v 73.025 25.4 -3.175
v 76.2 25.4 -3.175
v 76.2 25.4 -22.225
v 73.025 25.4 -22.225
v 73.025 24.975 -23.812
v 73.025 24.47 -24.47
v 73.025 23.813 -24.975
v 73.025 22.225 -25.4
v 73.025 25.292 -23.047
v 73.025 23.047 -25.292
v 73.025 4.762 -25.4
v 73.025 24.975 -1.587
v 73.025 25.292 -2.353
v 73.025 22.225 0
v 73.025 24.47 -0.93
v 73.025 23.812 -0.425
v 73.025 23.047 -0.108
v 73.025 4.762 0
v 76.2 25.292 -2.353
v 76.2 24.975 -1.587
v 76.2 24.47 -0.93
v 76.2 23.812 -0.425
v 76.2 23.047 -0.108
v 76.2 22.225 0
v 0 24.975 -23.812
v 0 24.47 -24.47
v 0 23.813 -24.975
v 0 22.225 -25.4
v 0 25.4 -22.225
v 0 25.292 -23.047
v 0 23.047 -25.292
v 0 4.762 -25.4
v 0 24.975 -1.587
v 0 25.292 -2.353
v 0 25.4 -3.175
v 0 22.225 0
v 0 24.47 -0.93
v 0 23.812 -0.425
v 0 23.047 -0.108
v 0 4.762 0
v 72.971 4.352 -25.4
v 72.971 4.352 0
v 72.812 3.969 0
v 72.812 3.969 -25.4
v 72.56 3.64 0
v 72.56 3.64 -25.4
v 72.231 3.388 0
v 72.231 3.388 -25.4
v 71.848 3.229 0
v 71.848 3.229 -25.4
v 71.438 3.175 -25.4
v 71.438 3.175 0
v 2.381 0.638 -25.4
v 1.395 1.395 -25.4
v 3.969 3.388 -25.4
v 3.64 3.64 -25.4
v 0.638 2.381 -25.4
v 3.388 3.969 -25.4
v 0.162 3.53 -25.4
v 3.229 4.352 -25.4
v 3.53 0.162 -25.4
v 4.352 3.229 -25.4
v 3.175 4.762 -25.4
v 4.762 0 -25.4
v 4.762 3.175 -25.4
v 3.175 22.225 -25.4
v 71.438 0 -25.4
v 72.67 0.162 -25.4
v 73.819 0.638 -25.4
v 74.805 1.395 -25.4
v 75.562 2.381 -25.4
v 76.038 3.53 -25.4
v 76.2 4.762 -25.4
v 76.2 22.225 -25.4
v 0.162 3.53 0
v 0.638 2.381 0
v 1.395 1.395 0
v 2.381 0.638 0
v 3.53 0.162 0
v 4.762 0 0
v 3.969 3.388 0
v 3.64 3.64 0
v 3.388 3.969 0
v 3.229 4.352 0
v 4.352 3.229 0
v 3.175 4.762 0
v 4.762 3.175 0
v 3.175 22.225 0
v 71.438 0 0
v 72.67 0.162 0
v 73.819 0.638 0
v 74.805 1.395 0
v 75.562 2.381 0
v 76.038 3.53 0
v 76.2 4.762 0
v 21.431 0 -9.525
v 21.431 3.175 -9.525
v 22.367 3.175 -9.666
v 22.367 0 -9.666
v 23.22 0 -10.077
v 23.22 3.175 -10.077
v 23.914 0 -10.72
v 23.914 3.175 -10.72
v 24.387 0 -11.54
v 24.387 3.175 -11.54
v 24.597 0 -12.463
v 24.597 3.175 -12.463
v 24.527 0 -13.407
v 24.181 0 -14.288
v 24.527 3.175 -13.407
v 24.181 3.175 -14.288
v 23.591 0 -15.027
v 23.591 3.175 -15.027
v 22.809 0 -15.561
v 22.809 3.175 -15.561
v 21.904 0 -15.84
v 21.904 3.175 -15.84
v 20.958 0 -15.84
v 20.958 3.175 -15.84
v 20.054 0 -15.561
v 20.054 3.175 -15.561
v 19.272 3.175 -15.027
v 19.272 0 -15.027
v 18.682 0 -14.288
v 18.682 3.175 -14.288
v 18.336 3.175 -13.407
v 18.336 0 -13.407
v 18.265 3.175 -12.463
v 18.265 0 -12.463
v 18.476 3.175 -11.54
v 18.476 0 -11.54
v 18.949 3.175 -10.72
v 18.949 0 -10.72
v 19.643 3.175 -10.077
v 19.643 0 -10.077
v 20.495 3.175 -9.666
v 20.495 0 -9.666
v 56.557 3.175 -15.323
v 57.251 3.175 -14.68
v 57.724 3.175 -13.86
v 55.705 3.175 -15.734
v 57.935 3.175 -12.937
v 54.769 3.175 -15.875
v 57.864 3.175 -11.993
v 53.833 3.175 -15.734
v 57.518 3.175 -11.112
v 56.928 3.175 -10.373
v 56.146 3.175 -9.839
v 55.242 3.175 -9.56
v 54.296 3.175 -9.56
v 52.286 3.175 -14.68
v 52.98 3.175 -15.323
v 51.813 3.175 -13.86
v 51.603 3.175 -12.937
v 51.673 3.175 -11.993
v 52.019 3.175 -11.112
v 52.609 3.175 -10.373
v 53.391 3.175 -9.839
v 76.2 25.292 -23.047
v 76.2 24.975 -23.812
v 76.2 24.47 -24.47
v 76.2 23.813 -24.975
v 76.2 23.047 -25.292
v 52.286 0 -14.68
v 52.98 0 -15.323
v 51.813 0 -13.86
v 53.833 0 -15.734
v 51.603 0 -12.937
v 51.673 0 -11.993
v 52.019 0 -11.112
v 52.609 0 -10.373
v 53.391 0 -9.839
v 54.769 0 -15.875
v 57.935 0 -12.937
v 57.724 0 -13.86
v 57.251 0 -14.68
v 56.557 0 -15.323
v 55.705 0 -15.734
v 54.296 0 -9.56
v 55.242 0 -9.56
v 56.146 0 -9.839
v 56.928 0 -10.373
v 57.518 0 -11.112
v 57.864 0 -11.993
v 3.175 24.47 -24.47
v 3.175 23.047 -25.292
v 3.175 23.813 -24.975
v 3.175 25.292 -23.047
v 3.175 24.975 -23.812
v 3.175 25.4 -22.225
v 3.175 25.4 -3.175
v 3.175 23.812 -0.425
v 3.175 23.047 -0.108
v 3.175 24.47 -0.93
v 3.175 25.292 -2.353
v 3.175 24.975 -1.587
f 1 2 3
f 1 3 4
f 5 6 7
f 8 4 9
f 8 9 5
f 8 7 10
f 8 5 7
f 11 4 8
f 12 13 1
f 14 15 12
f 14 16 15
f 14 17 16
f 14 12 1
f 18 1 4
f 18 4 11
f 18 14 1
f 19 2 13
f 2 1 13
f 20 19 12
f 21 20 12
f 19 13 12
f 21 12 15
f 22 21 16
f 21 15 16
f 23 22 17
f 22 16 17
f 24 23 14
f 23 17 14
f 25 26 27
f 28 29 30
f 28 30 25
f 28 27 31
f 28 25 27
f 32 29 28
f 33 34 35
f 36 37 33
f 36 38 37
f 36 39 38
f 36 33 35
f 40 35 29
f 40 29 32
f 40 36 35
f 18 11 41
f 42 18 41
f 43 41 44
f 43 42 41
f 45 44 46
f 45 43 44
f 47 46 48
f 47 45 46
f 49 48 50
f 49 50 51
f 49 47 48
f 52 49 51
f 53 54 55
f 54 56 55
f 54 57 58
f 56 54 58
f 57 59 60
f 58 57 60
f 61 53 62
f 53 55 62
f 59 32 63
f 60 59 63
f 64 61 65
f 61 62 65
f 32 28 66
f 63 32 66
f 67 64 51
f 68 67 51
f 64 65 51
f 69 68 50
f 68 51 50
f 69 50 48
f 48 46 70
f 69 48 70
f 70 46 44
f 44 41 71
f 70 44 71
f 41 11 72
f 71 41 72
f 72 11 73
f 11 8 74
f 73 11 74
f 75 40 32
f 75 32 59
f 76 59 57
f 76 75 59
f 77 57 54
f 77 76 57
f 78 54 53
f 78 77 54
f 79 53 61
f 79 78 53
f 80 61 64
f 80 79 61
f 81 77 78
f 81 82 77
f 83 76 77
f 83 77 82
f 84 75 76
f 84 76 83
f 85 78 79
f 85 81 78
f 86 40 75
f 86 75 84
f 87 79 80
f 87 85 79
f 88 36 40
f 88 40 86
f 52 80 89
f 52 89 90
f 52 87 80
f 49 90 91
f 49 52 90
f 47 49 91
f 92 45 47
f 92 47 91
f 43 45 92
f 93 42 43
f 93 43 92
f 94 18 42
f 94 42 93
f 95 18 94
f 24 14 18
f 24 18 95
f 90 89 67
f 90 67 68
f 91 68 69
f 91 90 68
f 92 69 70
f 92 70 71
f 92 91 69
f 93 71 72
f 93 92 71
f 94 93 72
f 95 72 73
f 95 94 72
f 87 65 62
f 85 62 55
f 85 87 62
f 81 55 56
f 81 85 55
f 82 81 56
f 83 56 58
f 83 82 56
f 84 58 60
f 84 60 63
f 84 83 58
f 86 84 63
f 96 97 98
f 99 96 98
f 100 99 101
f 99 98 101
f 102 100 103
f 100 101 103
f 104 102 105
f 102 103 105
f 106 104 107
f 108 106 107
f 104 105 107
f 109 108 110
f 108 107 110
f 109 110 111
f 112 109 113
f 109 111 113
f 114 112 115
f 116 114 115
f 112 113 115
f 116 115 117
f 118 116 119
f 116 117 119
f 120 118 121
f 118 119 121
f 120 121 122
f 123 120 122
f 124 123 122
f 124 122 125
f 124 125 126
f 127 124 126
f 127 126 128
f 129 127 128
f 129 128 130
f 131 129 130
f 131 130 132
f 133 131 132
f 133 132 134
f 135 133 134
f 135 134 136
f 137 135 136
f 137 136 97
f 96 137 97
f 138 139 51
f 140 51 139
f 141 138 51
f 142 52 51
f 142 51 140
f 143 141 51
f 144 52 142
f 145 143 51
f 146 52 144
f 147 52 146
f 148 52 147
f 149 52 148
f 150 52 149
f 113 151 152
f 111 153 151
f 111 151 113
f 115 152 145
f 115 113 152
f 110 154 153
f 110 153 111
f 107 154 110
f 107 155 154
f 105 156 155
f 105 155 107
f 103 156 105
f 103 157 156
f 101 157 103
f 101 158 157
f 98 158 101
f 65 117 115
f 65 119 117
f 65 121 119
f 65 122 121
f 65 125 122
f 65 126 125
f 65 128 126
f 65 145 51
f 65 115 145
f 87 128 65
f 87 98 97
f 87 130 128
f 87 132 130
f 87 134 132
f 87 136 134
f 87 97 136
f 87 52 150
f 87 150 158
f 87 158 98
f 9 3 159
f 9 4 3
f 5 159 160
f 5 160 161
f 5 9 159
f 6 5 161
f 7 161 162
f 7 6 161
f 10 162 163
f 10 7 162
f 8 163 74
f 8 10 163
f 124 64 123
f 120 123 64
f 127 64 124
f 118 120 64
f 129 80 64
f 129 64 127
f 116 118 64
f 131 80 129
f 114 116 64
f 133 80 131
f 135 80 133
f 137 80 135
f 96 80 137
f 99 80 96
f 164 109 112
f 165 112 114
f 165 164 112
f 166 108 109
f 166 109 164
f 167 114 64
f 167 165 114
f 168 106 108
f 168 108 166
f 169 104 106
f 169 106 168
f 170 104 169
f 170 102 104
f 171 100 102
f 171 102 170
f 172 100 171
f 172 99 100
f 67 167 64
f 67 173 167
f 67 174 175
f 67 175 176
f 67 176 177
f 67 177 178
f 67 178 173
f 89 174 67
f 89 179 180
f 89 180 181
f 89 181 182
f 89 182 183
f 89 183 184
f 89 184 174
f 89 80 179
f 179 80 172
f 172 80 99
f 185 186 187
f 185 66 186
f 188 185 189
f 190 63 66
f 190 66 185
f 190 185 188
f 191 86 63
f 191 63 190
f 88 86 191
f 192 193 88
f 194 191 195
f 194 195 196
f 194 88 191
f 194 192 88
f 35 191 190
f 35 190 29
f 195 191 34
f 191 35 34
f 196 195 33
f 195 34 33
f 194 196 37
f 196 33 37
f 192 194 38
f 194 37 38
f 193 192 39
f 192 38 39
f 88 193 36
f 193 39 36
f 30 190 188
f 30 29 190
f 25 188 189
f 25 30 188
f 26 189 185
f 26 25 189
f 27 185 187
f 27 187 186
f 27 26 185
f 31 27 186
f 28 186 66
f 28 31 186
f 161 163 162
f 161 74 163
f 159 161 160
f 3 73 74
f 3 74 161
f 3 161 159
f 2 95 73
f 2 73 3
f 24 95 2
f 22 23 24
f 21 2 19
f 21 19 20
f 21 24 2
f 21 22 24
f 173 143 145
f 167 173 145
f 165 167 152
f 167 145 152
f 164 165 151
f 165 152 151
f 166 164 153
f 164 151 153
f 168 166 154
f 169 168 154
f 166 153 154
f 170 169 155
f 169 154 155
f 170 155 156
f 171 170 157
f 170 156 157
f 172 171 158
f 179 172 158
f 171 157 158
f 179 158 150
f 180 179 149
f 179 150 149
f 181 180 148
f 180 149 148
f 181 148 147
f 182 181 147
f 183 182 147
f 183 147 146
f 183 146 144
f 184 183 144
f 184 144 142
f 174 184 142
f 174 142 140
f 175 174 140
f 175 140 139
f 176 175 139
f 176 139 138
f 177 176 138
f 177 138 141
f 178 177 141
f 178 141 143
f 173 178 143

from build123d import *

# Parameters (mm, degrees)
EXTRUDE_THIN1_DEPTH = 25.4
FILLET1_R           = 3.175
SKETCH2_R           = 3.175
EXTRUDE1_DEPTH      = 25.4


with BuildPart() as part:
    # Sketch1 → Extrude-Thin1 (new body)
    with BuildSketch(Plane.XY):
        with BuildLine():
            Line((0, 25.4), (0, 4.7625))
            ThreePointArc((0, 4.7625), (1.394903955, 1.394903955), (4.7625, 0))
            Line((4.7625, 0), (71.4375, 0))
            ThreePointArc((71.4375, 0), (74.805096045, 1.394903955), (76.2, 4.7625))
            Line((76.2, 4.7625), (76.2, 25.4))
            Line((76.2, 25.4), (73.025, 25.4))
            Line((73.025, 25.4), (73.025, 4.7625))
            ThreePointArc((73.025, 4.7625), (72.560032015, 3.639967985), (71.4375, 3.175))
            Line((71.4375, 3.175), (4.7625, 3.175))
            ThreePointArc((4.7625, 3.175), (3.639967985, 3.639967985), (3.175, 4.7625))
            Line((3.175, 4.7625), (3.175, 25.4))
            Line((3.175, 25.4), (0, 25.4))
        make_face()
    extrude(amount=-EXTRUDE_THIN1_DEPTH)

    # Fillet1
    fillet1_edges = [part.edges().sort_by_distance(p)[0] for p in [
        (1.5875, 25.4, 0),
        (74.6125, 25.4, 0),
        (1.5875, 25.4, -25.4),
        (74.6125, 25.4, -25.4),
    ]]
    fillet(fillet1_edges, radius=FILLET1_R)

    # Sketch2 → Extrude1 (cut)
    with BuildSketch(Plane(origin=(0, 3.175, 0), x_dir=(-1, 0, 0), z_dir=(0, 1, 0))):
        with Locations(Location((-21.43125, -12.7, 0), (0, 0, 90))):
            Circle(SKETCH2_R)
        with Locations(Location((-54.76875, -12.7, 0), (0, 0, 270))):
            Circle(SKETCH2_R)
    extrude(amount=-EXTRUDE1_DEPTH, mode=Mode.SUBTRACT)


solid = part.part
